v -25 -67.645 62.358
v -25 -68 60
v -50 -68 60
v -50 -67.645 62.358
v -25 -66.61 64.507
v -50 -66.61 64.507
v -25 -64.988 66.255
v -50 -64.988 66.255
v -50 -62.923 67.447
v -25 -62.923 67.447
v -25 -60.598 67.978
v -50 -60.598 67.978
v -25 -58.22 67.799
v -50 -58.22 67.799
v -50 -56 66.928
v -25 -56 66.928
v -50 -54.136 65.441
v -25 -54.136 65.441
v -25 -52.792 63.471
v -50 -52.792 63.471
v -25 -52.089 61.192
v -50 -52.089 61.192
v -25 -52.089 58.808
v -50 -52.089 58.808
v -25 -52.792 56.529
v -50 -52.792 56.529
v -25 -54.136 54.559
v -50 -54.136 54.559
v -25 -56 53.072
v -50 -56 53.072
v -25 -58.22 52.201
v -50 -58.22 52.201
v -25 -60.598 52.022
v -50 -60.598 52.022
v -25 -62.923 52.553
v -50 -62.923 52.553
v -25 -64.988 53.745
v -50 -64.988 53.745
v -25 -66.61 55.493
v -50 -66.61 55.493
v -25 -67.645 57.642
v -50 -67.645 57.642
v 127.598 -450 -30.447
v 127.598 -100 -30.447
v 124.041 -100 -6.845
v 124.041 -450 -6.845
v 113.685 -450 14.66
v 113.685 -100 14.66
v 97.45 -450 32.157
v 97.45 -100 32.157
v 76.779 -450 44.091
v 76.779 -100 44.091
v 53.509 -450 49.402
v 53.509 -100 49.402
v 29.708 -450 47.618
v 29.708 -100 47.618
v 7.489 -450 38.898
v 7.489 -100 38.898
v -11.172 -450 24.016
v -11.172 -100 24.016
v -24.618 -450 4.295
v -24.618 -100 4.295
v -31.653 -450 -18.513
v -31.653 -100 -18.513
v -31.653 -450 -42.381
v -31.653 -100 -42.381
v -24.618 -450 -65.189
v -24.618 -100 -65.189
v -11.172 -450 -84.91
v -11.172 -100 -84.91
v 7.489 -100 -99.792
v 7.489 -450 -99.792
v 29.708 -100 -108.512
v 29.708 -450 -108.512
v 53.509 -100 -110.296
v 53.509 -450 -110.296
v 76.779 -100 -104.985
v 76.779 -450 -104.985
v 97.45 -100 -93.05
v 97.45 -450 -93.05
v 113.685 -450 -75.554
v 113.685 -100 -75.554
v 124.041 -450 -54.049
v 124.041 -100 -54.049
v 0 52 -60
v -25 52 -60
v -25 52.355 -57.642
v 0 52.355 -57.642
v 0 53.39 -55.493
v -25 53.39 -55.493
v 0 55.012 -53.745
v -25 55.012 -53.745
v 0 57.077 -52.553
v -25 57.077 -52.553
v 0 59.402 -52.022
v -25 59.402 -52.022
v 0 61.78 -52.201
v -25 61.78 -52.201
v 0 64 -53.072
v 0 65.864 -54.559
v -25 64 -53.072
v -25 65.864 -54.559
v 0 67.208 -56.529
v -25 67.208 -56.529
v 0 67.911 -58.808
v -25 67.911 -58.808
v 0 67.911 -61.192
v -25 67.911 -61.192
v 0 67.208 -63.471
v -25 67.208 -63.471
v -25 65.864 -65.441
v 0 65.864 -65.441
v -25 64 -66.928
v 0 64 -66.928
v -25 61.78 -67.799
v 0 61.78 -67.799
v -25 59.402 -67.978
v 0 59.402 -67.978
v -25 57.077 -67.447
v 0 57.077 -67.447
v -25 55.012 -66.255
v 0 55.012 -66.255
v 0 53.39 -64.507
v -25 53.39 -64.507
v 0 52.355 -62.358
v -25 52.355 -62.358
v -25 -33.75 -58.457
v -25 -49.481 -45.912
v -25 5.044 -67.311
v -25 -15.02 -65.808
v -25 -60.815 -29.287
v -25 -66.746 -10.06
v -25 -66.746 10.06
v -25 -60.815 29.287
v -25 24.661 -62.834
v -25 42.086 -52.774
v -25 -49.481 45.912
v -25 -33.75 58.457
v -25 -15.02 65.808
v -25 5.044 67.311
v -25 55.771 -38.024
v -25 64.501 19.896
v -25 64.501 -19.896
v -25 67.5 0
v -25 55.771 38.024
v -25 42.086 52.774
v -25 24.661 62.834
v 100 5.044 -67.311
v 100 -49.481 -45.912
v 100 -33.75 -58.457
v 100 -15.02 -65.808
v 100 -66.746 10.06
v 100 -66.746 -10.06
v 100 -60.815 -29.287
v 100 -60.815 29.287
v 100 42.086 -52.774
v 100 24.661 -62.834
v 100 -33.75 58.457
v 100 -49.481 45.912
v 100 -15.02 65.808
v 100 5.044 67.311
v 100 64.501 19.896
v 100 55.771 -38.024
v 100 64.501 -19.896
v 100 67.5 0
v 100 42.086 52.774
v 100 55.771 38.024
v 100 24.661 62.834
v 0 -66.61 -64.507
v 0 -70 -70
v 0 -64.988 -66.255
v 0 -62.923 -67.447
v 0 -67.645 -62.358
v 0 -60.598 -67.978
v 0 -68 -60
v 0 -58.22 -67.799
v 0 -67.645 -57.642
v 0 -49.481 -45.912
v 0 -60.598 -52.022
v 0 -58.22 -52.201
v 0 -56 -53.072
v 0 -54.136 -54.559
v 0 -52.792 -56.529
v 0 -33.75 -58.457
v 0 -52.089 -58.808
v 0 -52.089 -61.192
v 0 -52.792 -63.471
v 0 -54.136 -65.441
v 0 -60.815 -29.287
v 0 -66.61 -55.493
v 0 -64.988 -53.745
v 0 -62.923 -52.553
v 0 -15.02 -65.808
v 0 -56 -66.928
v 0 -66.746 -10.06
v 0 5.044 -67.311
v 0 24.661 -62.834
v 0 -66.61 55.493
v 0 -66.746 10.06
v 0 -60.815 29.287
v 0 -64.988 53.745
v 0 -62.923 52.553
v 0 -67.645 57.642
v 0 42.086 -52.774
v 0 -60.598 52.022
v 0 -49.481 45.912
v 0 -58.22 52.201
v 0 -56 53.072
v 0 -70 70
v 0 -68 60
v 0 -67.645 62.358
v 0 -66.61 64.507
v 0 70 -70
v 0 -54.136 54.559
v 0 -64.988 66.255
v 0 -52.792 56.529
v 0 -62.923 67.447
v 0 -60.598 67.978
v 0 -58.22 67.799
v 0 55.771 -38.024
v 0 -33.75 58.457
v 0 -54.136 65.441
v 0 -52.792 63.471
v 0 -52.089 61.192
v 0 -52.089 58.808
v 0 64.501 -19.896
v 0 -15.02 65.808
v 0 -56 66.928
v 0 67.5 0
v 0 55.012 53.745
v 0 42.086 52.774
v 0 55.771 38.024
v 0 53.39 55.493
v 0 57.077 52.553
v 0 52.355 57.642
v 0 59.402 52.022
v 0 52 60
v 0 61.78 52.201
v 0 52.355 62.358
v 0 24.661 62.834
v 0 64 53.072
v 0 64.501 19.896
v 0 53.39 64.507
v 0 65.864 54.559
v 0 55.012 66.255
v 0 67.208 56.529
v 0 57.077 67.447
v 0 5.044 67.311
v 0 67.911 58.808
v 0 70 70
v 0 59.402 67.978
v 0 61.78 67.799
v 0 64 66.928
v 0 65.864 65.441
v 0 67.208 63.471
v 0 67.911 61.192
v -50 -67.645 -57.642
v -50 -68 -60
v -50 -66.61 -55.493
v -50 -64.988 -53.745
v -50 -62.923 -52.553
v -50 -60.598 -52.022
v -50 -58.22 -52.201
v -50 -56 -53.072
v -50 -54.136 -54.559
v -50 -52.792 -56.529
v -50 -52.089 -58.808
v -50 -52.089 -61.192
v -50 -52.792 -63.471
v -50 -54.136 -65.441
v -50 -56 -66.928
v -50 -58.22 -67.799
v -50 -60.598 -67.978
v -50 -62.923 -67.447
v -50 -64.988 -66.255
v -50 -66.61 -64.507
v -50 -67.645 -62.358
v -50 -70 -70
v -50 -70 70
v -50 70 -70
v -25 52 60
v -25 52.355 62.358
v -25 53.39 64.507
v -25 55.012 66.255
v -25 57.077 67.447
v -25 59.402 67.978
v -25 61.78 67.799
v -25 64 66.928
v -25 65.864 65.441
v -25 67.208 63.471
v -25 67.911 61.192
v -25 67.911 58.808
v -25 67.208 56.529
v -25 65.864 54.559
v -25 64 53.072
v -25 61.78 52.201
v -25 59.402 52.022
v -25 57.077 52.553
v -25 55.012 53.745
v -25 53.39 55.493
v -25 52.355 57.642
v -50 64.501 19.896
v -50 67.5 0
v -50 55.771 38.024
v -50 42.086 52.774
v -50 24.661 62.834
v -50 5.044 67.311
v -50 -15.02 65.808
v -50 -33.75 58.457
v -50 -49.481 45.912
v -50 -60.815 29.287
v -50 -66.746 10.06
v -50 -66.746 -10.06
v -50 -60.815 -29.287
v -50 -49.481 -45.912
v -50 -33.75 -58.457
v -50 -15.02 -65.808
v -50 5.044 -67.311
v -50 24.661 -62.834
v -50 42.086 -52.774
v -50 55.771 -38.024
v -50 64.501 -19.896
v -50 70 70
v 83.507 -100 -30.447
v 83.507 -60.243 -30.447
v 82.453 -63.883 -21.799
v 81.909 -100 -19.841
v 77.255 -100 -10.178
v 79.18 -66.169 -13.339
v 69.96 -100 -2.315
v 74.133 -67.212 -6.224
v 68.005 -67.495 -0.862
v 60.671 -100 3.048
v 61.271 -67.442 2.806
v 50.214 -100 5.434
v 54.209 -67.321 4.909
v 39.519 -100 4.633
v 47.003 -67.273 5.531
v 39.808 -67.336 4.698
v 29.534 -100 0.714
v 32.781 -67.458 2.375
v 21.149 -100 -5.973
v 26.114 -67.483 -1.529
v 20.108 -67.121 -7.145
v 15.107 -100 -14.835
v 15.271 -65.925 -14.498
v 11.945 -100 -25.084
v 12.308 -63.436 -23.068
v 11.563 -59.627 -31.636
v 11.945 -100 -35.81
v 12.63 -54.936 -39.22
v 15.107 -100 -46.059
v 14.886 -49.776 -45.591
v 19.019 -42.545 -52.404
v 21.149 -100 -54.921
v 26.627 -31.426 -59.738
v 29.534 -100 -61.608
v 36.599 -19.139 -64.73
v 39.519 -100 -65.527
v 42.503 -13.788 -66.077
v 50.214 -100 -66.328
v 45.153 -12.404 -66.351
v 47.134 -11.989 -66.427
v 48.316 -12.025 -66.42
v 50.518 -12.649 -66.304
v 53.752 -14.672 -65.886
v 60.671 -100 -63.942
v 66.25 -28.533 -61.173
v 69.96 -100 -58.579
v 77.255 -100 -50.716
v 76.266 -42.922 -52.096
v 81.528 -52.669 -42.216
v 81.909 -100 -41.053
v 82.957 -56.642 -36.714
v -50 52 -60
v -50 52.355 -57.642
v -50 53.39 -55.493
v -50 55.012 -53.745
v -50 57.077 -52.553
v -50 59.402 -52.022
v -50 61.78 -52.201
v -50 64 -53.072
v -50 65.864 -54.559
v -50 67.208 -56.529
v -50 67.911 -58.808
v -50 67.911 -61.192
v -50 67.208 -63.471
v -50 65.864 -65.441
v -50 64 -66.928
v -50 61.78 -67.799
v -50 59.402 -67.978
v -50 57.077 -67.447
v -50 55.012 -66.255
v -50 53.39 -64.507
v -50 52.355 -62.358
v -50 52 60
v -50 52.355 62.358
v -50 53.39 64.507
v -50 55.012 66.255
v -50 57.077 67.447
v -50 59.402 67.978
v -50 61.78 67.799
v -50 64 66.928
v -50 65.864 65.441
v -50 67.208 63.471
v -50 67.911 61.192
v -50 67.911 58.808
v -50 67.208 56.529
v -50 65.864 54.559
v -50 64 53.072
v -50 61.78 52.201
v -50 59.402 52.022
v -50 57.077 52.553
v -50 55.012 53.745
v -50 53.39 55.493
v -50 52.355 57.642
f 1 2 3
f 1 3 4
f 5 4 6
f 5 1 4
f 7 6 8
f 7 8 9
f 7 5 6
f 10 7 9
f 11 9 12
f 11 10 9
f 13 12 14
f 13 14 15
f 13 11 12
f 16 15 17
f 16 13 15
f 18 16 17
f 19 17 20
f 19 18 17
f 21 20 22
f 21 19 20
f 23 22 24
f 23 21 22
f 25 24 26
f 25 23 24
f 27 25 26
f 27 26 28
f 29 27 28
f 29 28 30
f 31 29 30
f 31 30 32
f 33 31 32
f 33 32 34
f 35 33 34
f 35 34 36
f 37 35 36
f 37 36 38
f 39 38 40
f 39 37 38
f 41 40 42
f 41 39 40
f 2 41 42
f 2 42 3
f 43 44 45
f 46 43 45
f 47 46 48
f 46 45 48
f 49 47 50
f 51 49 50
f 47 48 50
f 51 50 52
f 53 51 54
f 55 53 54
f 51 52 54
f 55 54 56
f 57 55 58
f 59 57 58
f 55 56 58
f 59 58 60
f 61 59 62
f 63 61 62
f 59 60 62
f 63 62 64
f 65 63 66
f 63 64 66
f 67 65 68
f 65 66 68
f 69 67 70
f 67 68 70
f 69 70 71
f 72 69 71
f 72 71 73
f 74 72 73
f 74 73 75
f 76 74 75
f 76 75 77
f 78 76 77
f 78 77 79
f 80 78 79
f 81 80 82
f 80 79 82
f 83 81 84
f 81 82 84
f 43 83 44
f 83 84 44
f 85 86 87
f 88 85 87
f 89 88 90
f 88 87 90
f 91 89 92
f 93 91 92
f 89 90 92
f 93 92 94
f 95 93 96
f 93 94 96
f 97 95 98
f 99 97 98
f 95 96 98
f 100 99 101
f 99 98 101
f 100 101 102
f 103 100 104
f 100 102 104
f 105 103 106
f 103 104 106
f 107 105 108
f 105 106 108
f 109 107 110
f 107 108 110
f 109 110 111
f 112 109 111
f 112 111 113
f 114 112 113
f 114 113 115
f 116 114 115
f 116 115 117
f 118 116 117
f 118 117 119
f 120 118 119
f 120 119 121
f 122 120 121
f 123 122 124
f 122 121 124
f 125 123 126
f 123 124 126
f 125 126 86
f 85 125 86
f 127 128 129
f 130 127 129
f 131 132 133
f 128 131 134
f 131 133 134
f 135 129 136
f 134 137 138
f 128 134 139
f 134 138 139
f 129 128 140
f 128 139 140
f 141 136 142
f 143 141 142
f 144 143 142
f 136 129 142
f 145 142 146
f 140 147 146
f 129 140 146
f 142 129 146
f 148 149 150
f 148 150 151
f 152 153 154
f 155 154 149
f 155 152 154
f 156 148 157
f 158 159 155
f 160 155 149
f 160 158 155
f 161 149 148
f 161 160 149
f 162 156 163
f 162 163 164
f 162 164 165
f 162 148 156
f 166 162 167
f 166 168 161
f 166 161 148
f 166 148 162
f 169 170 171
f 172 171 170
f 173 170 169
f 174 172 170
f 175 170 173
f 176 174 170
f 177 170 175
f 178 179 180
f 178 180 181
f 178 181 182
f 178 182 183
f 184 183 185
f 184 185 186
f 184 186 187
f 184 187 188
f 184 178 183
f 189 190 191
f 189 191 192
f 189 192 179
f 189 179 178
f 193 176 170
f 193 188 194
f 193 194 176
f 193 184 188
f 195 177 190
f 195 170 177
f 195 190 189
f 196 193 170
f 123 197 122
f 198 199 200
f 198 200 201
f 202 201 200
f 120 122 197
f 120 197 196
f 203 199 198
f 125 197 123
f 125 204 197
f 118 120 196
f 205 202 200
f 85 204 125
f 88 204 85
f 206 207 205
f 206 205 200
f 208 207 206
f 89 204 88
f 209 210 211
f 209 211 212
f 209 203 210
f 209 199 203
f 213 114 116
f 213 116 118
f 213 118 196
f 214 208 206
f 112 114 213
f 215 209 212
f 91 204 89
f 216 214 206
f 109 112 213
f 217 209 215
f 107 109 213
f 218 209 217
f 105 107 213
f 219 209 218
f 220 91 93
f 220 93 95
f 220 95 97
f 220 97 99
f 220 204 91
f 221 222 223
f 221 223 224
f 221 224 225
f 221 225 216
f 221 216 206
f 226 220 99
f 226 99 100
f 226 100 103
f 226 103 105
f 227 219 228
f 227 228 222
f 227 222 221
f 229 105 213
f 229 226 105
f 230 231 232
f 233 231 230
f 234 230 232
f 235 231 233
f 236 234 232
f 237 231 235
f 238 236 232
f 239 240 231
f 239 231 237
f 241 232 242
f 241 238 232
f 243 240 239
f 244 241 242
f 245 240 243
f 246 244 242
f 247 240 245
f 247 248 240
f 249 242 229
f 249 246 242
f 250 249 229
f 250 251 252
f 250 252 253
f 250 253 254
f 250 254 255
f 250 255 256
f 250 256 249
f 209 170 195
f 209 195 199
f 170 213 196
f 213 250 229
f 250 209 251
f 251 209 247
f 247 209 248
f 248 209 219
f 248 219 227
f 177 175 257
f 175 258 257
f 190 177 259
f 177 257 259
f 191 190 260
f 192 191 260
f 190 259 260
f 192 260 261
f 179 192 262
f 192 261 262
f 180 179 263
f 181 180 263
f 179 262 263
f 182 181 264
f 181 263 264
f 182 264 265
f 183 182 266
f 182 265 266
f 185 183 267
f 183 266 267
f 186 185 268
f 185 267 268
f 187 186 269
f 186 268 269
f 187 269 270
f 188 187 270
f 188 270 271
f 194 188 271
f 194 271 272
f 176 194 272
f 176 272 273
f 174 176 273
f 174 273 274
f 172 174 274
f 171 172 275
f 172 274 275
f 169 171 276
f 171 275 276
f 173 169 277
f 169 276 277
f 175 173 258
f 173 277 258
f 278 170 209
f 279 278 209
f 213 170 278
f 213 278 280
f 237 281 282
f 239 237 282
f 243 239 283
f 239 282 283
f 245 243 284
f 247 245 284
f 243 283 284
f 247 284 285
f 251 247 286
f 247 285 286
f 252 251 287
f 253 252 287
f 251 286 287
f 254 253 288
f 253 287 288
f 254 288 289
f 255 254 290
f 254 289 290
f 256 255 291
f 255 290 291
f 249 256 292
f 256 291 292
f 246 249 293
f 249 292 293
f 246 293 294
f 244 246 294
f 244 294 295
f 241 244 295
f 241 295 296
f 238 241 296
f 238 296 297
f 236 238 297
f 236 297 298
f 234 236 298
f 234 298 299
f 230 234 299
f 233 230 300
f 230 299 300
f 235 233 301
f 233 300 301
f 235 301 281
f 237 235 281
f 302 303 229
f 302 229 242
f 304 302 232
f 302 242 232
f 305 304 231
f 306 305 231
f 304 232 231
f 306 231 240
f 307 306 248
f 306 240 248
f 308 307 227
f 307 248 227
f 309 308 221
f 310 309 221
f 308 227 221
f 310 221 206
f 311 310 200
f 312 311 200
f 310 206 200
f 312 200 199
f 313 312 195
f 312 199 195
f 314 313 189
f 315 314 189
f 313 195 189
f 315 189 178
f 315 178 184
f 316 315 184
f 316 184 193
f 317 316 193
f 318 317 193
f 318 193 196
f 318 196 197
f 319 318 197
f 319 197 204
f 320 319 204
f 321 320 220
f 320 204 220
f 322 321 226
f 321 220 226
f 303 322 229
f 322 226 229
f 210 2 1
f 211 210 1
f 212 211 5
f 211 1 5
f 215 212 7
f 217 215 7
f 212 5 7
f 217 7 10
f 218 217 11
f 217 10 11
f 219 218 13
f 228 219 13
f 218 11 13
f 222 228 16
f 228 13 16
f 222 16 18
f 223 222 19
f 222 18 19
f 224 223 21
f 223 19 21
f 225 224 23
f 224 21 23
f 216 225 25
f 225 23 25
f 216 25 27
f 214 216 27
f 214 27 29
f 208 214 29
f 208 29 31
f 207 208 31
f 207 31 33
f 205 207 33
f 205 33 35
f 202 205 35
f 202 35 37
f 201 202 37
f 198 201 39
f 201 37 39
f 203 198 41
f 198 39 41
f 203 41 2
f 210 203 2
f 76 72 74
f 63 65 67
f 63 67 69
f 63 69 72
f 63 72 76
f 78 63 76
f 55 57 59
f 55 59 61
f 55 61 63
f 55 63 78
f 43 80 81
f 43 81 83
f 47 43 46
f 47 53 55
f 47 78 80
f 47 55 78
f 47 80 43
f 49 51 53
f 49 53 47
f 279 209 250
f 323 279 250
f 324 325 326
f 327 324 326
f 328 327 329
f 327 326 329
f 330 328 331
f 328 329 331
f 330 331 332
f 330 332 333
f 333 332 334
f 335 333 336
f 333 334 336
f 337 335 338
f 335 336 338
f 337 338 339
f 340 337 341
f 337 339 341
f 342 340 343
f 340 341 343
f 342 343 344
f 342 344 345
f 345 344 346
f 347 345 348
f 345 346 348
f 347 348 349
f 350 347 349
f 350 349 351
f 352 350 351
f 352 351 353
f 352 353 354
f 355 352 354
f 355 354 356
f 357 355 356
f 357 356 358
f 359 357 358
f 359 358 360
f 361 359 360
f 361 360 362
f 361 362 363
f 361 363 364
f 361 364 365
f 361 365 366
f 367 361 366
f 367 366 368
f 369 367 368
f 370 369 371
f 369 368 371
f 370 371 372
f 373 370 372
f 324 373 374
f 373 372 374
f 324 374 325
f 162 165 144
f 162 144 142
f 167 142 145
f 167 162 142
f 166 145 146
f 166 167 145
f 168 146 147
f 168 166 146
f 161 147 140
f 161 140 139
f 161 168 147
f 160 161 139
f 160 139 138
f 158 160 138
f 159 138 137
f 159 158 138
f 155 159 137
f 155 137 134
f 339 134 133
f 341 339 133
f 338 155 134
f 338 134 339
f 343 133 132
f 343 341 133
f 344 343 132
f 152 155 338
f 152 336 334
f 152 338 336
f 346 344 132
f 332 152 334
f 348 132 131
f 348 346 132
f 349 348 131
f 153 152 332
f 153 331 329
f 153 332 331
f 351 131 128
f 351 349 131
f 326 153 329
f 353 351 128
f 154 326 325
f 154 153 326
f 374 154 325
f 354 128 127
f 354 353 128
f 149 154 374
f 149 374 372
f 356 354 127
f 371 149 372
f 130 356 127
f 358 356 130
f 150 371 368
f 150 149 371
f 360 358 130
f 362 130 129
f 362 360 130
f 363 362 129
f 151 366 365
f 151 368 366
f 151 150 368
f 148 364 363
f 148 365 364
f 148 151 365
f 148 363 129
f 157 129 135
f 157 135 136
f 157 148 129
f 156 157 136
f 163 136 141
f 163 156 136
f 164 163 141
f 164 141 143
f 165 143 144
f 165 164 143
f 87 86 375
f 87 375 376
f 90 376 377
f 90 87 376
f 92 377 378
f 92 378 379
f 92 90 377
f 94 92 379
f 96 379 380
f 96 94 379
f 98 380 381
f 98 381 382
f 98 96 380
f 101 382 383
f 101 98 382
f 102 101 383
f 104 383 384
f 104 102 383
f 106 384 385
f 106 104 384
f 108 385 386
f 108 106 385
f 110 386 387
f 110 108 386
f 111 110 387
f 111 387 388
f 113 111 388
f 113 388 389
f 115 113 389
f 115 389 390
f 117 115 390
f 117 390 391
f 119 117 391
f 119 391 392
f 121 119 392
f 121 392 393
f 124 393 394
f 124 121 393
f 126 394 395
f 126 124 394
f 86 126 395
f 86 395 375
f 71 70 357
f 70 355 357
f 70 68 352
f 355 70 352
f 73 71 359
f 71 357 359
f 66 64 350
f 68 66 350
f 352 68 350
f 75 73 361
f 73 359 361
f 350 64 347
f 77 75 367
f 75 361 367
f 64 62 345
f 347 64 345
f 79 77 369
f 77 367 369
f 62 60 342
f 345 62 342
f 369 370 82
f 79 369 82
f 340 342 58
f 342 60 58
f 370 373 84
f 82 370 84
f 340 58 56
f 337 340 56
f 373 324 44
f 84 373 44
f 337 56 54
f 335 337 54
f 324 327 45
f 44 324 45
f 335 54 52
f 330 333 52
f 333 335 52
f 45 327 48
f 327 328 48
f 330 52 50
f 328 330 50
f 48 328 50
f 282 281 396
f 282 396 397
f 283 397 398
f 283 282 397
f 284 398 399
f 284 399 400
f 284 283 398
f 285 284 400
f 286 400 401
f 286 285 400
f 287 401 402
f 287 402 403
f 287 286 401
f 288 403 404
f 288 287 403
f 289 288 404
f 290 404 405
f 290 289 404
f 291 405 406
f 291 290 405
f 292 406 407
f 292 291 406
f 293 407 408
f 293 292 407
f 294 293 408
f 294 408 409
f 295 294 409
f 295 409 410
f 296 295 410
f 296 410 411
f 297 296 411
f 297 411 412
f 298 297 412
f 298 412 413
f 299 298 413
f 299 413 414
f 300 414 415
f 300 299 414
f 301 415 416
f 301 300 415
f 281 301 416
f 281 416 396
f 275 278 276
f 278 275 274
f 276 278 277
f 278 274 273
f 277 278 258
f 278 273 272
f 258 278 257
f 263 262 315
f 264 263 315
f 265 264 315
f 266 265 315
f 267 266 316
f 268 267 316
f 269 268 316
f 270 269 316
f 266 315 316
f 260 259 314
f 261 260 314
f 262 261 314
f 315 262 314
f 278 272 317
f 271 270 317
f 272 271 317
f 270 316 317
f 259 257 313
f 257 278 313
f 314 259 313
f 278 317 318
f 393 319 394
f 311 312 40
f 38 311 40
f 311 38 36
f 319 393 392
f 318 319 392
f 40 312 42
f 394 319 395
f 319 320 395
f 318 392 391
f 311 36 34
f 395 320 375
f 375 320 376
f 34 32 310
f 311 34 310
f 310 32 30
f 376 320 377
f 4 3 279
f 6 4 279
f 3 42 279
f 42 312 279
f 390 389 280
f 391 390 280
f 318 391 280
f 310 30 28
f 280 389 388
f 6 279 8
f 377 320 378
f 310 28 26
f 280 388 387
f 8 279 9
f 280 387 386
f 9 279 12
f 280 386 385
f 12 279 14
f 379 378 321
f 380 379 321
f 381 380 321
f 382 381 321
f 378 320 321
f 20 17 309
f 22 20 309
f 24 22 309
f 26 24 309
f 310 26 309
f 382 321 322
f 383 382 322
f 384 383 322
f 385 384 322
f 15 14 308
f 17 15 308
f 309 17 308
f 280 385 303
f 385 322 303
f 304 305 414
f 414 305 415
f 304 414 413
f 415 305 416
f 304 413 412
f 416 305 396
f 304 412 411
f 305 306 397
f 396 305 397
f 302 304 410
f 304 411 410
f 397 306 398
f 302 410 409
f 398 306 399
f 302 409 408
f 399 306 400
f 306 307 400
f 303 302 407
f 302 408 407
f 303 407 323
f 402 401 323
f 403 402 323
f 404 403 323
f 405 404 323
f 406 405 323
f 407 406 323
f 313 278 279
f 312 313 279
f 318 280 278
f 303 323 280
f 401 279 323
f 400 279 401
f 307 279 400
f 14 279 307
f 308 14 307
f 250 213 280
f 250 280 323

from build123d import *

# Parameters (mm, degrees)
F0_W          = 140
F0_H          = 140
F0_R          = 67.5
F1_DEPTH      = 50
F2_R          = 67.5
F3_DEPTH      = 100
F3_DEPTH_BACK = 25
F4_R          = 8
F5_DEPTH      = 25
F6_R          = 35.981944186
F7_DEPTH      = 100
F8_R          = 80.0728434977
F8_R_2        = 35.981944186
F9_DEPTH      = 350


with BuildPart() as f1:
    # F0 (on Right) → F1 (new body)
    with BuildSketch(Plane.YZ):
        Rectangle(F0_W, F0_H)
        Circle(F0_R, mode=Mode.SUBTRACT)
    extrude(amount=-F1_DEPTH)

    # F4 (on face) → F5 (cut, symmetric)
    with BuildSketch(Plane(origin=(-25, 0, 0), x_dir=(0, -1, 0), z_dir=(-1, 0, 0))):
        with Locations((60, 60)):
            Circle(F4_R)
        with Locations((-60, 60)):
            Circle(F4_R)
        with Locations((-60, -60)):
            Circle(F4_R)
        with Locations((60, -60)):
            Circle(F4_R)
    extrude(amount=F5_DEPTH, both=True, mode=Mode.SUBTRACT)


with BuildPart() as f3:
    # F2 (on face) → F3 (new body, two sides)
    with BuildSketch(Plane.YZ) as f3_sk:
        Circle(F2_R)
    extrude(amount=F3_DEPTH)
    extrude(f3_sk.sketch, amount=-F3_DEPTH_BACK)

    # F6 (on Front) → F7 (join)
    with BuildSketch(Plane.XZ):
        with Locations((47.5254356861, -30.4469484836)):
            Circle(F6_R)
    extrude(amount=F7_DEPTH)

    # F8 (on face) → F9 (join)
    with BuildSketch(Plane.XZ.offset(100)):
        with Locations((47.5254356861, -30.4469484836)):
            Circle(F8_R)
        with Locations((47.5254356861, -30.4469484836)):
            Circle(F8_R_2, mode=Mode.SUBTRACT)
        with Locations((47.5254356861, -30.4469484836)):
            Circle(F8_R_2)
    extrude(amount=F9_DEPTH)


solid = Compound([f1.part, f3.part])
